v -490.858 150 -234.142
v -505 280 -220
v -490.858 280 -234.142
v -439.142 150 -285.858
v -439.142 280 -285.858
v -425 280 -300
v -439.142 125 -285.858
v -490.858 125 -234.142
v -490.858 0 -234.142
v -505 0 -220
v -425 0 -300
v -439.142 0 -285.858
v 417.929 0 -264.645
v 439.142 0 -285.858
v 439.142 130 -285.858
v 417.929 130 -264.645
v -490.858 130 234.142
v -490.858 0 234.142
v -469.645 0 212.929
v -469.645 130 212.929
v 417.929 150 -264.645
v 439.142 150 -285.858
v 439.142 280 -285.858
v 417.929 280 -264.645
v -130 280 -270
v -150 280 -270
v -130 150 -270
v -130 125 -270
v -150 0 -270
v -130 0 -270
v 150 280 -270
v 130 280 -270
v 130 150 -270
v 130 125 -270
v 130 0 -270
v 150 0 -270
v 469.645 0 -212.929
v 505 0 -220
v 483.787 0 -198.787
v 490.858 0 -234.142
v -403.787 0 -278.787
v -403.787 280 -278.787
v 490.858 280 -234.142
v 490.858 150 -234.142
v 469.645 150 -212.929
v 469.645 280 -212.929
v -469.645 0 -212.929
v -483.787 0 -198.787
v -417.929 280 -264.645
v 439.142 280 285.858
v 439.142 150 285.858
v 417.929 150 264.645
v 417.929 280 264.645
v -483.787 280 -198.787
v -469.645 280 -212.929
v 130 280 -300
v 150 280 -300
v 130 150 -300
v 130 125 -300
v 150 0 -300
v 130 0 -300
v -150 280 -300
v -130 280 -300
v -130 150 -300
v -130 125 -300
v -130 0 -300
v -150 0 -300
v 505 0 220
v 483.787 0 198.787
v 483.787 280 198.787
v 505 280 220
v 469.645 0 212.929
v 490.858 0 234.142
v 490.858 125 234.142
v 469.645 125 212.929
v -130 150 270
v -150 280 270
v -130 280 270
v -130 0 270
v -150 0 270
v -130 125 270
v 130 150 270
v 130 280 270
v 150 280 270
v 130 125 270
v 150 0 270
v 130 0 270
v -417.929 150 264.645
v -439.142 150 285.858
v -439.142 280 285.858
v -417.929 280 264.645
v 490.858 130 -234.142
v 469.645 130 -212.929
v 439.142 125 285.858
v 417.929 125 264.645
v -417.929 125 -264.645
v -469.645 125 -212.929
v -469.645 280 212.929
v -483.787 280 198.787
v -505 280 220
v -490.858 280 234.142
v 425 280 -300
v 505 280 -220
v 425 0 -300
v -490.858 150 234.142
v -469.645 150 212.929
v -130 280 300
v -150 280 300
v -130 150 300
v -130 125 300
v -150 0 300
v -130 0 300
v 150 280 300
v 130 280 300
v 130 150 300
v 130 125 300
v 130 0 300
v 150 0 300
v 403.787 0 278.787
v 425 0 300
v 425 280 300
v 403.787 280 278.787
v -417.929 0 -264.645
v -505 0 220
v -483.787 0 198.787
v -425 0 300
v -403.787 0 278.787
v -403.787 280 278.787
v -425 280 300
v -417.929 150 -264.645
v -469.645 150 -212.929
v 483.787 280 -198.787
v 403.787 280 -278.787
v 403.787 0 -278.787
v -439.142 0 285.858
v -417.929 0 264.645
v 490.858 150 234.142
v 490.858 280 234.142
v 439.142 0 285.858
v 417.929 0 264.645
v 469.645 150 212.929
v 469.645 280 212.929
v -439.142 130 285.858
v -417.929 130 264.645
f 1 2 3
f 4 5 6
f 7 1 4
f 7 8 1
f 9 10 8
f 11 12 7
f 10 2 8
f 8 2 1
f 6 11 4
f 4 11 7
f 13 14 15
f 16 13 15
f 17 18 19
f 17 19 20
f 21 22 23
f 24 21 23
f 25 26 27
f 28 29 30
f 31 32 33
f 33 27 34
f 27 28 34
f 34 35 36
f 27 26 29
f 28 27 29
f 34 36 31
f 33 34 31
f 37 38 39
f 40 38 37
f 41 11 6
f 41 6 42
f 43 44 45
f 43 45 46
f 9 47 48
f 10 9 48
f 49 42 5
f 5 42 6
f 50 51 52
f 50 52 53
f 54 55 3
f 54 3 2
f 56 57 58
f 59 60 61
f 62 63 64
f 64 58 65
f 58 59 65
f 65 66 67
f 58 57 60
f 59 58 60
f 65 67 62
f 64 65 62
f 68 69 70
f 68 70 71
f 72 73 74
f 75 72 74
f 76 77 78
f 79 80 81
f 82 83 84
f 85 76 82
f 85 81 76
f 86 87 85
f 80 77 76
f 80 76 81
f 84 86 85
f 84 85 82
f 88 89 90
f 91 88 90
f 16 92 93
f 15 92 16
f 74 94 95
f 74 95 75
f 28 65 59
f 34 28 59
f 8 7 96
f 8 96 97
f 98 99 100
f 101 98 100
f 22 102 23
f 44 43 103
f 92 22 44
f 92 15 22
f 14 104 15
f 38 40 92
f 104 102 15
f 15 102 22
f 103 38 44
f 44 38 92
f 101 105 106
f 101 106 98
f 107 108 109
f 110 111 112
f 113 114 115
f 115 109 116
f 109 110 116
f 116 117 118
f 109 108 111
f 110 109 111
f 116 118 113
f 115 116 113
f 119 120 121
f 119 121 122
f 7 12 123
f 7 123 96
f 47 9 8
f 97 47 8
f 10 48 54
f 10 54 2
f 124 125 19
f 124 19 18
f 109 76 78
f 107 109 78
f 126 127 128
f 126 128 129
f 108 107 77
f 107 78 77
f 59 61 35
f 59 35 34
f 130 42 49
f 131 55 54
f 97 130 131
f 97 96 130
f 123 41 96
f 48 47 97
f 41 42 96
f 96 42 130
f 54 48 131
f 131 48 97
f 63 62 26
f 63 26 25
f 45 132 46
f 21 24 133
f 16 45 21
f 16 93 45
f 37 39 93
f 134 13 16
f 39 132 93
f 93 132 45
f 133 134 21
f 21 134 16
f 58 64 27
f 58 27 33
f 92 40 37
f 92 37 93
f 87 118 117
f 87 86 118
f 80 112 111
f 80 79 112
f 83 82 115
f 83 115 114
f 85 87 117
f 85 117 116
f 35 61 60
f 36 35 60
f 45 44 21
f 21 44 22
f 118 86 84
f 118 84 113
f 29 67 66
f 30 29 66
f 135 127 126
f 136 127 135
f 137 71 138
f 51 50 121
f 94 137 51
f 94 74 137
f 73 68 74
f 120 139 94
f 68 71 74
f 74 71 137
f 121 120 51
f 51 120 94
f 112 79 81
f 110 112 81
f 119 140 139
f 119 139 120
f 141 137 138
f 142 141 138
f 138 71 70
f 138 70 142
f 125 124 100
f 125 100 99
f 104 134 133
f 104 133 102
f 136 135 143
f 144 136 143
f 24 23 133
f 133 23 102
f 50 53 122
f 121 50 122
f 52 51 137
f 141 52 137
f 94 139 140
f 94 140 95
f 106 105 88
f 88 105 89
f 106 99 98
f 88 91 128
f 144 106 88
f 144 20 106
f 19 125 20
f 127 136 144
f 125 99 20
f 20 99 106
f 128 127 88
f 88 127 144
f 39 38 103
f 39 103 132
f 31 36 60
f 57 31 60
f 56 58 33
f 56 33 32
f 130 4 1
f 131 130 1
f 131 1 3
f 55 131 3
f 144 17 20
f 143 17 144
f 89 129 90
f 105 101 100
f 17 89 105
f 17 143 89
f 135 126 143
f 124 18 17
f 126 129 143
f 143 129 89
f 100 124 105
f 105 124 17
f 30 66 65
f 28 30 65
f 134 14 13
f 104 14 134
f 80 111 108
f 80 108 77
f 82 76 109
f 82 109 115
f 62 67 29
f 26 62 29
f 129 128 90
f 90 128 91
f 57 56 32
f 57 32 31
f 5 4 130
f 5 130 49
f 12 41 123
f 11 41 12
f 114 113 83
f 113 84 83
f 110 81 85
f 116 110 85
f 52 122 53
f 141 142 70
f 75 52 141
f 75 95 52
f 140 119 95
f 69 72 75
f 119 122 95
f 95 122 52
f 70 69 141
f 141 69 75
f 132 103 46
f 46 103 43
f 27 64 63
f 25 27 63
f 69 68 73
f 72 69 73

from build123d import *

# Parameters (mm, degrees)
EXTRUDE_1_DEPTH          = 280
EXTRUDE_1_2_DEPTH        = 280
EXTRUDE_1_3_DEPTH        = 280
EXTRUDE_1_4_DEPTH        = 280
EXTRUDE_1_5_DEPTH        = 280
EXTRUDE_1_6_DEPTH        = 280
CUT_EXTRUDE_1_DEPTH      = 833.72144202
CUT_EXTRUDE_1_DEPTH_BACK = 833.72144202
SKETCH_2_W               = 260
SKETCH_2_H               = 130
SKETCH_2_H_2             = 125
SKETCH_3_W               = 73.13708499
SKETCH_3_H               = 130
SKETCH_3_H_2             = 125
CUT_EXTRUDE_2_DEPTH      = 30
SKETCH_4_W               = 73.13708499
SKETCH_4_H               = 130
CUT_EXTRUDE_3_DEPTH      = 30
SKETCH_5_W               = 73.13708499
SKETCH_5_H               = 130
SKETCH_5_H_2             = 125
CUT_EXTRUDE_4_DEPTH      = 30
SKETCH_6_W               = 73.13708499
SKETCH_6_H               = 130
CUT_EXTRUDE_5_DEPTH      = 30


with BuildPart() as part:
    # 草图1 → 凸台-拉伸1 (new body)
    with BuildSketch(Plane(origin=(0, 0, 0), x_dir=(1, 0, 0), z_dir=(0, 1, 0))):
        Polygon((-505, 220), (-425, 300), (-403.786796564, 278.786796564), (-483.786796564, 198.786796564), align=None)
    extrude(amount=EXTRUDE_1_DEPTH)

    # 草图5 → 切除-拉伸4 (cut)
    with BuildSketch(Plane(origin=(-362.5, 0, -362.5), x_dir=(-0.7071067811865475, 0, 0.7071067811865477), z_dir=(-0.7071067811865477, 0, -0.7071067811865475))):
        with Locations((144.956890143, 215)):
            Rectangle(SKETCH_5_W, SKETCH_5_H)
        with Locations((144.956890143, 62.5)):
            Rectangle(SKETCH_5_W, SKETCH_5_H_2)
    extrude(amount=-CUT_EXTRUDE_4_DEPTH, mode=Mode.SUBTRACT)


with BuildPart() as body_2:
    # 草图1 → Extrude 1 2 (new body)
    with BuildSketch(Plane(origin=(0, 0, 0), x_dir=(1, 0, 0), z_dir=(0, 1, 0))):
        Polygon((-150, 270), (150, 270), (150, 300), (0, 300), (-150, 300), align=None)
    extrude(amount=EXTRUDE_1_2_DEPTH)


with BuildPart() as body_3:
    # 草图1 → Extrude 1 3 (new body)
    with BuildSketch(Plane(origin=(0, 0, 0), x_dir=(1, 0, 0), z_dir=(0, 1, 0))):
        Polygon((505, 220), (483.786796564, 198.786796564), (403.786796564, 278.786796564), (425, 300), align=None)
    extrude(amount=EXTRUDE_1_3_DEPTH)

    # 草图4 → 切除-拉伸3 (cut)
    with BuildSketch(Plane(origin=(362.5, 0, -362.5), x_dir=(-0.7071067811865475, 0, -0.7071067811865477), z_dir=(0.7071067811865477, 0, -0.7071067811865475))):
        with Locations((-144.956890143, 215)):
            Rectangle(SKETCH_4_W, SKETCH_4_H)
        with Locations((-144.956890143, 65)):
            Rectangle(SKETCH_4_W, SKETCH_4_H)
    extrude(amount=-CUT_EXTRUDE_3_DEPTH, mode=Mode.SUBTRACT)


with BuildPart() as body_4:
    # 草图1 → Extrude 1 4 (new body)
    with BuildSketch(Plane(origin=(0, 0, 0), x_dir=(1, 0, 0), z_dir=(0, 1, 0))):
        Polygon((505, -220), (425, -300), (403.786796564, -278.786796564), (483.786796564, -198.786796564), align=None)
    extrude(amount=EXTRUDE_1_4_DEPTH)

    # 草图3 → 切除-拉伸2 (cut)
    with BuildSketch(Plane(origin=(362.5, 0, 362.5), x_dir=(0.7071067811865475, 0, -0.7071067811865477), z_dir=(0.7071067811865477, 0, 0.7071067811865475))):
        with Locations((144.956890143, 215)):
            Rectangle(SKETCH_3_W, SKETCH_3_H)
        with Locations((144.956890143, 62.5)):
            Rectangle(SKETCH_3_W, SKETCH_3_H_2)
    extrude(amount=-CUT_EXTRUDE_2_DEPTH, mode=Mode.SUBTRACT)


with BuildPart() as body_5:
    # 草图1 → Extrude 1 5 (new body)
    with BuildSketch(Plane(origin=(0, 0, 0), x_dir=(1, 0, 0), z_dir=(0, 1, 0))):
        Polygon((-150, -300), (-150, -270), (150, -270), (150, -300), (0, -300), align=None)
    extrude(amount=EXTRUDE_1_5_DEPTH)


with BuildPart() as body_6:
    # 草图1 → Extrude 1 6 (new body)
    with BuildSketch(Plane(origin=(0, 0, 0), x_dir=(1, 0, 0), z_dir=(0, 1, 0))):
        Polygon((-505, -220), (-483.786796564, -198.786796564), (-403.786796564, -278.786796564), (-425, -300), align=None)
    extrude(amount=EXTRUDE_1_6_DEPTH)

    # 草图6 → 切除-拉伸5 (cut)
    with BuildSketch(Plane(origin=(-362.5, 0, 362.5), x_dir=(0.7071067811865475, 0, 0.7071067811865477), z_dir=(-0.7071067811865477, 0, 0.7071067811865475))):
        with Locations((-144.956890143, 215)):
            Rectangle(SKETCH_6_W, SKETCH_6_H)
        with Locations((-144.956890143, 65)):
            Rectangle(SKETCH_6_W, SKETCH_6_H)
    extrude(amount=-CUT_EXTRUDE_5_DEPTH, mode=Mode.SUBTRACT)


with BuildPart() as cut_extrude_1_tool:
    # 草图2 → 切除-拉伸1 (new, two sides: drawn at the far end of the back side and taken through both)
    with BuildSketch(Plane.XY.offset(300).offset(-CUT_EXTRUDE_1_DEPTH_BACK)):
        with Locations((0, 215)):
            Rectangle(SKETCH_2_W, SKETCH_2_H)
        with Locations((0, 62.5)):
            Rectangle(SKETCH_2_W, SKETCH_2_H_2)
    extrude(amount=CUT_EXTRUDE_1_DEPTH + CUT_EXTRUDE_1_DEPTH_BACK)


with BuildPart() as body_2_1:
    add(body_2.part)

    # 切除-拉伸1: cut by cut_extrude_1_tool
    add(cut_extrude_1_tool.part, mode=Mode.SUBTRACT)


with BuildPart() as body_5_1:
    add(body_5.part)

    # 切除-拉伸1: cut by cut_extrude_1_tool
    add(cut_extrude_1_tool.part, mode=Mode.SUBTRACT)


solid = Compound([part.part, body_3.part, body_4.part, body_6.part, body_2_1.part, body_5_1.part])
